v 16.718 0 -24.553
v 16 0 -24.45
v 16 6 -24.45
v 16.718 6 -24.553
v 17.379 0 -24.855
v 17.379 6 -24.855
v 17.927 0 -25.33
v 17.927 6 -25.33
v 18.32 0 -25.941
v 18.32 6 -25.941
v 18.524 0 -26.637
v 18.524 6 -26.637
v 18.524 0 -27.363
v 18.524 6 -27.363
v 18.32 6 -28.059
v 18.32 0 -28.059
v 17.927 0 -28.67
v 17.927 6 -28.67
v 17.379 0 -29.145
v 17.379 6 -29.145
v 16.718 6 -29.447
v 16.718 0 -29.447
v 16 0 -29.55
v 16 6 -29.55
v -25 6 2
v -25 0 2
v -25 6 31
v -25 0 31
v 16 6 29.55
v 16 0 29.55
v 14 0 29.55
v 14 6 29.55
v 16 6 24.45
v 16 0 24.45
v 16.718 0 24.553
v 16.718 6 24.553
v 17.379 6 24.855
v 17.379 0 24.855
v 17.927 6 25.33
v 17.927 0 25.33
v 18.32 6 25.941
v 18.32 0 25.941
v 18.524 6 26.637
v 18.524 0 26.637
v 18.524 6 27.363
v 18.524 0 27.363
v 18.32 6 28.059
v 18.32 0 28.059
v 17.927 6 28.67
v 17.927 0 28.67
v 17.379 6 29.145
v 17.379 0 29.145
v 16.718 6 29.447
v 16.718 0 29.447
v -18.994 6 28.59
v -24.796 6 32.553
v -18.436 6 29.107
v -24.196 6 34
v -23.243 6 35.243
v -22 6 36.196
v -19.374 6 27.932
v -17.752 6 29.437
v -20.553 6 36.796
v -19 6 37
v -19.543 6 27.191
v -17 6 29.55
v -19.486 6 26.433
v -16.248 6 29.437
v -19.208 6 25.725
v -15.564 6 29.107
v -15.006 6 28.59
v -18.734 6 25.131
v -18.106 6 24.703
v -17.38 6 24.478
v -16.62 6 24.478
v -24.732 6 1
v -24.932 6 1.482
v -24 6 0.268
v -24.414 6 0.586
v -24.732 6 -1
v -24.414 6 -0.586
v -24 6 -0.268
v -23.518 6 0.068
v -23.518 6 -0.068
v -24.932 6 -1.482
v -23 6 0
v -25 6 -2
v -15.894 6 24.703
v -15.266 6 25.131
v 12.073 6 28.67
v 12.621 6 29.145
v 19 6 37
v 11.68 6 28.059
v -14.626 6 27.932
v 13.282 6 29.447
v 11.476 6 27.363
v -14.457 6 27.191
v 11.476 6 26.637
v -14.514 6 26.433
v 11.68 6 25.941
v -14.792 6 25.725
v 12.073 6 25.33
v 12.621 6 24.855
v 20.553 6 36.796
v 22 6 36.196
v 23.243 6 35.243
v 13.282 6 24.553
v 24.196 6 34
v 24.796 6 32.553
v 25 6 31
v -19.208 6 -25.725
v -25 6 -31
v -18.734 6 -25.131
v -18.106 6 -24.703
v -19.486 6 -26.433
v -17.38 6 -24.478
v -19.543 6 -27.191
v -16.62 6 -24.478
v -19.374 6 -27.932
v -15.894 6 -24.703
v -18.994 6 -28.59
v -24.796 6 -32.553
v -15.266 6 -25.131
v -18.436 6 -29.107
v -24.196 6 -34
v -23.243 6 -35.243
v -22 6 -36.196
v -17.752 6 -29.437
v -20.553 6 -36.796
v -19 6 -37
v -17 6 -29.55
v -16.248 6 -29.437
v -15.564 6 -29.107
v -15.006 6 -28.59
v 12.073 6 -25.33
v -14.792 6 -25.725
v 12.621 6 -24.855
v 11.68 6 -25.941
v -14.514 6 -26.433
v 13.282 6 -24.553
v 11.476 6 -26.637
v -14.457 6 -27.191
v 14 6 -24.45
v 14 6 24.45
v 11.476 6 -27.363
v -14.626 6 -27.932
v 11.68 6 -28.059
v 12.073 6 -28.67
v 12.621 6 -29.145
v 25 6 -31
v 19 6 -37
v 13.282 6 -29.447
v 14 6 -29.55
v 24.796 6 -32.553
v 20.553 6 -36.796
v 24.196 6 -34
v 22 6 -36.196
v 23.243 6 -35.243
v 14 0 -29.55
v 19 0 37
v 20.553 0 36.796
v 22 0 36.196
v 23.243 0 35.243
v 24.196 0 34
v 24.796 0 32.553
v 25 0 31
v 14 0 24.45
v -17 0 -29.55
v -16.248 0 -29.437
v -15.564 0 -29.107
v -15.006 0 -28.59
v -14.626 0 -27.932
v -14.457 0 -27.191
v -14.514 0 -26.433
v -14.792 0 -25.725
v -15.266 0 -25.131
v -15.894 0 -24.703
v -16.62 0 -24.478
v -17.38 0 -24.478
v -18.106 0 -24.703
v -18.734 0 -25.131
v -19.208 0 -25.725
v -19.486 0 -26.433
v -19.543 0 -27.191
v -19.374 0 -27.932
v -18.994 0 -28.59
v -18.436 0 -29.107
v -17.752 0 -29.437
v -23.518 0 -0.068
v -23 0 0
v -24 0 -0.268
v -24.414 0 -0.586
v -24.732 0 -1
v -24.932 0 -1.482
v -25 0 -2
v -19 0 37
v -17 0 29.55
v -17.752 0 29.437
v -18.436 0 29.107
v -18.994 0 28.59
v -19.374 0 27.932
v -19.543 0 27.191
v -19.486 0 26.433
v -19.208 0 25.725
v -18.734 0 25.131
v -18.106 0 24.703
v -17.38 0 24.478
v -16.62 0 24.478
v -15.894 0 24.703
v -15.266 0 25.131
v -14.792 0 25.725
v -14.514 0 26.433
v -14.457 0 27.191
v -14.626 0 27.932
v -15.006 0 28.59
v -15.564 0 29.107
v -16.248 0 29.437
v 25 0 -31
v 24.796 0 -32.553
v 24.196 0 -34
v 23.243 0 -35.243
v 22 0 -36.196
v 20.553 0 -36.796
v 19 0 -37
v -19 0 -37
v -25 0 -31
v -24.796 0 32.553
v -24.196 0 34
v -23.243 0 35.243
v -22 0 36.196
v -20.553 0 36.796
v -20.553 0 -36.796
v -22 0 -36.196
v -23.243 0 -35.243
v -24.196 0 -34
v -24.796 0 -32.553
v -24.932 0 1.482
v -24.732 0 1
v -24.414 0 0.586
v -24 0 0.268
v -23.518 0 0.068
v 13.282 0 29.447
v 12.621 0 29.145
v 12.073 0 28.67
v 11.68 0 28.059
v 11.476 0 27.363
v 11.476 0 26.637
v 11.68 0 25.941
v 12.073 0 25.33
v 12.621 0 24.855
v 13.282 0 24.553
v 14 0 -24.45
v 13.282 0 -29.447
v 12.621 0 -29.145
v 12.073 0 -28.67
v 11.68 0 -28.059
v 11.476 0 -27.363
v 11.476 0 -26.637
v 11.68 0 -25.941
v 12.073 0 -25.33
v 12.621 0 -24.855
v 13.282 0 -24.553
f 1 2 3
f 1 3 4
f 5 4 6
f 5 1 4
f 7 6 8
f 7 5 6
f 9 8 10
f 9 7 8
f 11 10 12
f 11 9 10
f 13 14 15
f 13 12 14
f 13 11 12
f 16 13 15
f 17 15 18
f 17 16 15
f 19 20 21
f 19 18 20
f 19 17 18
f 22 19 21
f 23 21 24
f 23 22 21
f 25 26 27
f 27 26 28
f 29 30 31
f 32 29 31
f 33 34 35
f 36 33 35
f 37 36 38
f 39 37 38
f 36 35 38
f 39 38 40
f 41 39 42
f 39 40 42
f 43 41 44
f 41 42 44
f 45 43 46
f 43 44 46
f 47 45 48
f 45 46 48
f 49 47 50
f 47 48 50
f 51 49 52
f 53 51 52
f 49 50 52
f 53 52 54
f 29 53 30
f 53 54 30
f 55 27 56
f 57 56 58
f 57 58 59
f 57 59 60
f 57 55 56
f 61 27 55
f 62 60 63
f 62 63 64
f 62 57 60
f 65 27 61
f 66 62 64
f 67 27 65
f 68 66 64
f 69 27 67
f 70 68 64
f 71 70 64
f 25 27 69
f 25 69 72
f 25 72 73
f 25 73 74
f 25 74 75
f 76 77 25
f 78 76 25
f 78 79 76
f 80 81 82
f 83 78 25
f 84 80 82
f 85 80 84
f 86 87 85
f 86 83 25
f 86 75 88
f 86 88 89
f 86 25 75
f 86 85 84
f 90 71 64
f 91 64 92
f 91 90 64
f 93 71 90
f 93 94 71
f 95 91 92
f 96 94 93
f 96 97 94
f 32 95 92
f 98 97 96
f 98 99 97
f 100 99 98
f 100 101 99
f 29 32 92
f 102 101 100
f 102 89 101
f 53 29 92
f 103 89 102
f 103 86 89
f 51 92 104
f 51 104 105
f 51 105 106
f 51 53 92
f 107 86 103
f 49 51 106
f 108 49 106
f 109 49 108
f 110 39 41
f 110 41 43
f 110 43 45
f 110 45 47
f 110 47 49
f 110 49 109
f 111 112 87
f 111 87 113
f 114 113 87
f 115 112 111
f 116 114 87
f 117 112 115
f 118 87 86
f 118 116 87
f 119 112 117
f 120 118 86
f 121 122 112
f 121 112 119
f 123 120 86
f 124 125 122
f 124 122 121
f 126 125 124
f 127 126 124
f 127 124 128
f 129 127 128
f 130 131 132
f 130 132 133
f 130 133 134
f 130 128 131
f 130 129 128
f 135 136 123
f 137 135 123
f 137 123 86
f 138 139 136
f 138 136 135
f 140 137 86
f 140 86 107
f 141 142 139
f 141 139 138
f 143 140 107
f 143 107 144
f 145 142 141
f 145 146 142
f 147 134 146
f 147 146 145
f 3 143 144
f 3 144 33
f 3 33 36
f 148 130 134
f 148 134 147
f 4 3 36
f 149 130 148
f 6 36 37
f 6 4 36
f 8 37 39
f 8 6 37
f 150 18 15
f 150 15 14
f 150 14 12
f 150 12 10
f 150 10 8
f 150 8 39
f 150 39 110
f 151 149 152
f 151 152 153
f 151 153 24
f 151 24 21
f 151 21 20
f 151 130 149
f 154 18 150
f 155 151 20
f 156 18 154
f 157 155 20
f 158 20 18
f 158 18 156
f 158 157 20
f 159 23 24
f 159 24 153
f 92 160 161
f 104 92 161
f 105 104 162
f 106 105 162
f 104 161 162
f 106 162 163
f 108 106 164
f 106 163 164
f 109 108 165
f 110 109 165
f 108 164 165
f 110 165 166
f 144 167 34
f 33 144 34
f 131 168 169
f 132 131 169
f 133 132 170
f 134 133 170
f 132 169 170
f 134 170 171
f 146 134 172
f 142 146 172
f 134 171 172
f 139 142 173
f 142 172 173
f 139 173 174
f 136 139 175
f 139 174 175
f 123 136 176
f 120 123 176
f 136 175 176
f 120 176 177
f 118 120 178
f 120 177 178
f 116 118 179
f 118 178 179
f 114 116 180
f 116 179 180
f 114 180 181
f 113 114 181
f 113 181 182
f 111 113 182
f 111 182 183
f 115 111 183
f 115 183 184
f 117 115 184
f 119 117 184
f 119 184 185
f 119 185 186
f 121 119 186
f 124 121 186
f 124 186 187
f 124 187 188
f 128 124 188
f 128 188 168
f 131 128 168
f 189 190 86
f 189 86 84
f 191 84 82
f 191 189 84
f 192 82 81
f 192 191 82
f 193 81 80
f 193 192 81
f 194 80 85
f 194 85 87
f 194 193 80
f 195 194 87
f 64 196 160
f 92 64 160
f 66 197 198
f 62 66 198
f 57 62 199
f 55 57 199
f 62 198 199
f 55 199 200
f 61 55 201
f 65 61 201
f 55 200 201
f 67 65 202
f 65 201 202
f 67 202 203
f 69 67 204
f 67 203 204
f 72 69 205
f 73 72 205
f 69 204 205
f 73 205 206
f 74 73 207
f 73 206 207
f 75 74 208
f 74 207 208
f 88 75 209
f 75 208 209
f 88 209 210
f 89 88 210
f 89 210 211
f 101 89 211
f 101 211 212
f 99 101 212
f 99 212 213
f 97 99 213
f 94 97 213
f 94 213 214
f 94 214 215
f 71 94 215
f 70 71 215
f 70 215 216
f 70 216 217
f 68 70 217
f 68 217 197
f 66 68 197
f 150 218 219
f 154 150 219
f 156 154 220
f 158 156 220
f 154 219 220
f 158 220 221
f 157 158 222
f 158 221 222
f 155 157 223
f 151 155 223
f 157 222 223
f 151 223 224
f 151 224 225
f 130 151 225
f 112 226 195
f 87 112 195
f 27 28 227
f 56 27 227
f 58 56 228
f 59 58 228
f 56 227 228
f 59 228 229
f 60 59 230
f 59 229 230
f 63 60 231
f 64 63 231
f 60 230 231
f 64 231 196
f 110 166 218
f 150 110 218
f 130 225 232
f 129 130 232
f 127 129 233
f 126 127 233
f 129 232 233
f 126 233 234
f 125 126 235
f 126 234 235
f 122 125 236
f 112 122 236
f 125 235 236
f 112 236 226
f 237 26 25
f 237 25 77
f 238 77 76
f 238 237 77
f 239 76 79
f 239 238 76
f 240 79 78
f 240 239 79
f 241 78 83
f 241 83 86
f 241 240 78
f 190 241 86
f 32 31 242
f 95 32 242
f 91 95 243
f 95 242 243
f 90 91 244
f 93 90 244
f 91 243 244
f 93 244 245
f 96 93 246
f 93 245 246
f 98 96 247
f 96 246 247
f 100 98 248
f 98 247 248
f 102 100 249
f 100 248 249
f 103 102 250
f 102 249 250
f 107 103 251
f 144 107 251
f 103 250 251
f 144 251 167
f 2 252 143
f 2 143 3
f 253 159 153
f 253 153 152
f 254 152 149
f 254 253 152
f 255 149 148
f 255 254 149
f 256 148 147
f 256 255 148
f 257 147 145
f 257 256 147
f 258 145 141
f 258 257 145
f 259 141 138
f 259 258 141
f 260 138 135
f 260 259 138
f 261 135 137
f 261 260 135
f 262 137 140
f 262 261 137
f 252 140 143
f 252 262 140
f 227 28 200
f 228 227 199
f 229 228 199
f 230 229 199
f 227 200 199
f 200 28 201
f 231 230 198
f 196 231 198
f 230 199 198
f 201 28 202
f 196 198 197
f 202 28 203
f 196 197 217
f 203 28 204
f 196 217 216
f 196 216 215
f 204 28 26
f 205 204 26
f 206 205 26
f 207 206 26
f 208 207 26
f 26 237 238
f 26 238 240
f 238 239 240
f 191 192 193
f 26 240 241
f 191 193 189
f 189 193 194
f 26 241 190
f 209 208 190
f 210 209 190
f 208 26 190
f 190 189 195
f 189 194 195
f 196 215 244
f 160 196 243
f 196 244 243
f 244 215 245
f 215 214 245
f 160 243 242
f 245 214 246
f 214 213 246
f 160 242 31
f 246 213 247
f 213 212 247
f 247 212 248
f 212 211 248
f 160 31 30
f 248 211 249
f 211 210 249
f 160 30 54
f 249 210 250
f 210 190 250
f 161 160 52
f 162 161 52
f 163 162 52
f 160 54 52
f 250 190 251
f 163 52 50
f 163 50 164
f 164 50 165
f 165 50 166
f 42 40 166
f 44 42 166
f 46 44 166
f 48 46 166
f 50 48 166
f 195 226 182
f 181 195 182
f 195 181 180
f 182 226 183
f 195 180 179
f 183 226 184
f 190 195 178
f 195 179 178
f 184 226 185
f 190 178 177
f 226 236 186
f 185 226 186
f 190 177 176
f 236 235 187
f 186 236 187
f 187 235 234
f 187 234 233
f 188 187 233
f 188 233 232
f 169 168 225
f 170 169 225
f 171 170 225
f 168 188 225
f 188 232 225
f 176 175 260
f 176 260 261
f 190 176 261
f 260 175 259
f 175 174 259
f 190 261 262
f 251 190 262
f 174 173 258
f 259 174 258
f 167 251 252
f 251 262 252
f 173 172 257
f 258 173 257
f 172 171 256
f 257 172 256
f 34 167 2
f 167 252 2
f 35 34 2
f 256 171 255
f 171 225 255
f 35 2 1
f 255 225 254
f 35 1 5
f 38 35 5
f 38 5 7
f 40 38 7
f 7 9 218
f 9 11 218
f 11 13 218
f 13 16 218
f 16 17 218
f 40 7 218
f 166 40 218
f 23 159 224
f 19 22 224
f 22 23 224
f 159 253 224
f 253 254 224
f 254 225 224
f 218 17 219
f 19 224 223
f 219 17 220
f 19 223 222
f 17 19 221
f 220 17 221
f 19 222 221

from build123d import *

# Parameters (mm, degrees)
EXTRUDE_1_DEPTH     = 6
SKETCH_2_R          = 2.55
CUT_EXTRUDE_1_DEPTH = 46.055521304
CUT_EXTRUDE_2_DEPTH = 46.055521304


with BuildPart() as part:
    # Эскиз1 → Бобышка-Вытянуть1 (new body)
    with BuildSketch(Plane(origin=(0, 0, 0), x_dir=(1, 0, 0), z_dir=(0, 1, 0))):
        with BuildLine():
            Line((-19, -37), (19, -37))
            ThreePointArc((19, -37), (23.242640687, -35.242640687), (25, -31))
            Line((25, -31), (25, 31))
            ThreePointArc((25, 31), (23.242640687, 35.242640687), (19, 37))
            Line((19, 37), (-19, 37))
            ThreePointArc((-19, 37), (-23.242640687, 35.242640687), (-25, 31))
            Line((-25, 31), (-25, -31))
            ThreePointArc((-25, -31), (-23.242640687, -35.242640687), (-19, -37))
        make_face()
    extrude(amount=EXTRUDE_1_DEPTH)

    # Эскиз2 → Вырез-Вытянуть1 (cut, through all)
    with BuildSketch(Plane.XZ):
        with Locations(Location((-17, -27, 0), (0, 0, 270))):
            Circle(SKETCH_2_R)
        with Locations(Location((-17, 27, 0), (0, 0, 90))):
            Circle(SKETCH_2_R)
        with BuildLine():
            Line((16, -29.55), (14, -29.55))
            ThreePointArc((14, -29.55), (11.45, -27), (14, -24.45))
            Line((14, -24.45), (16, -24.45))
            ThreePointArc((16, -24.45), (18.55, -27), (16, -29.55))
        make_face()
        with BuildLine():
            Line((16, 29.55), (14, 29.55))
            ThreePointArc((14, 29.55), (11.45, 27), (14, 24.45))
            Line((14, 24.45), (16, 24.45))
            ThreePointArc((16, 24.45), (18.55, 27), (16, 29.55))
        make_face()
    extrude(amount=-CUT_EXTRUDE_1_DEPTH, mode=Mode.SUBTRACT)

    # Эскиз3 → Вырез-Вытянуть2 (cut, through all)
    with BuildSketch(Plane.XZ):
        with BuildLine():
            Line((-25, -2), (-25, 2))
            ThreePointArc((-25, 2), (-24.414213562, 0.585786438), (-23, 0))
            ThreePointArc((-23, 0), (-24.414213562, -0.585786438), (-25, -2))
        make_face()
    extrude(amount=-CUT_EXTRUDE_2_DEPTH, mode=Mode.SUBTRACT)


solid = part.part
